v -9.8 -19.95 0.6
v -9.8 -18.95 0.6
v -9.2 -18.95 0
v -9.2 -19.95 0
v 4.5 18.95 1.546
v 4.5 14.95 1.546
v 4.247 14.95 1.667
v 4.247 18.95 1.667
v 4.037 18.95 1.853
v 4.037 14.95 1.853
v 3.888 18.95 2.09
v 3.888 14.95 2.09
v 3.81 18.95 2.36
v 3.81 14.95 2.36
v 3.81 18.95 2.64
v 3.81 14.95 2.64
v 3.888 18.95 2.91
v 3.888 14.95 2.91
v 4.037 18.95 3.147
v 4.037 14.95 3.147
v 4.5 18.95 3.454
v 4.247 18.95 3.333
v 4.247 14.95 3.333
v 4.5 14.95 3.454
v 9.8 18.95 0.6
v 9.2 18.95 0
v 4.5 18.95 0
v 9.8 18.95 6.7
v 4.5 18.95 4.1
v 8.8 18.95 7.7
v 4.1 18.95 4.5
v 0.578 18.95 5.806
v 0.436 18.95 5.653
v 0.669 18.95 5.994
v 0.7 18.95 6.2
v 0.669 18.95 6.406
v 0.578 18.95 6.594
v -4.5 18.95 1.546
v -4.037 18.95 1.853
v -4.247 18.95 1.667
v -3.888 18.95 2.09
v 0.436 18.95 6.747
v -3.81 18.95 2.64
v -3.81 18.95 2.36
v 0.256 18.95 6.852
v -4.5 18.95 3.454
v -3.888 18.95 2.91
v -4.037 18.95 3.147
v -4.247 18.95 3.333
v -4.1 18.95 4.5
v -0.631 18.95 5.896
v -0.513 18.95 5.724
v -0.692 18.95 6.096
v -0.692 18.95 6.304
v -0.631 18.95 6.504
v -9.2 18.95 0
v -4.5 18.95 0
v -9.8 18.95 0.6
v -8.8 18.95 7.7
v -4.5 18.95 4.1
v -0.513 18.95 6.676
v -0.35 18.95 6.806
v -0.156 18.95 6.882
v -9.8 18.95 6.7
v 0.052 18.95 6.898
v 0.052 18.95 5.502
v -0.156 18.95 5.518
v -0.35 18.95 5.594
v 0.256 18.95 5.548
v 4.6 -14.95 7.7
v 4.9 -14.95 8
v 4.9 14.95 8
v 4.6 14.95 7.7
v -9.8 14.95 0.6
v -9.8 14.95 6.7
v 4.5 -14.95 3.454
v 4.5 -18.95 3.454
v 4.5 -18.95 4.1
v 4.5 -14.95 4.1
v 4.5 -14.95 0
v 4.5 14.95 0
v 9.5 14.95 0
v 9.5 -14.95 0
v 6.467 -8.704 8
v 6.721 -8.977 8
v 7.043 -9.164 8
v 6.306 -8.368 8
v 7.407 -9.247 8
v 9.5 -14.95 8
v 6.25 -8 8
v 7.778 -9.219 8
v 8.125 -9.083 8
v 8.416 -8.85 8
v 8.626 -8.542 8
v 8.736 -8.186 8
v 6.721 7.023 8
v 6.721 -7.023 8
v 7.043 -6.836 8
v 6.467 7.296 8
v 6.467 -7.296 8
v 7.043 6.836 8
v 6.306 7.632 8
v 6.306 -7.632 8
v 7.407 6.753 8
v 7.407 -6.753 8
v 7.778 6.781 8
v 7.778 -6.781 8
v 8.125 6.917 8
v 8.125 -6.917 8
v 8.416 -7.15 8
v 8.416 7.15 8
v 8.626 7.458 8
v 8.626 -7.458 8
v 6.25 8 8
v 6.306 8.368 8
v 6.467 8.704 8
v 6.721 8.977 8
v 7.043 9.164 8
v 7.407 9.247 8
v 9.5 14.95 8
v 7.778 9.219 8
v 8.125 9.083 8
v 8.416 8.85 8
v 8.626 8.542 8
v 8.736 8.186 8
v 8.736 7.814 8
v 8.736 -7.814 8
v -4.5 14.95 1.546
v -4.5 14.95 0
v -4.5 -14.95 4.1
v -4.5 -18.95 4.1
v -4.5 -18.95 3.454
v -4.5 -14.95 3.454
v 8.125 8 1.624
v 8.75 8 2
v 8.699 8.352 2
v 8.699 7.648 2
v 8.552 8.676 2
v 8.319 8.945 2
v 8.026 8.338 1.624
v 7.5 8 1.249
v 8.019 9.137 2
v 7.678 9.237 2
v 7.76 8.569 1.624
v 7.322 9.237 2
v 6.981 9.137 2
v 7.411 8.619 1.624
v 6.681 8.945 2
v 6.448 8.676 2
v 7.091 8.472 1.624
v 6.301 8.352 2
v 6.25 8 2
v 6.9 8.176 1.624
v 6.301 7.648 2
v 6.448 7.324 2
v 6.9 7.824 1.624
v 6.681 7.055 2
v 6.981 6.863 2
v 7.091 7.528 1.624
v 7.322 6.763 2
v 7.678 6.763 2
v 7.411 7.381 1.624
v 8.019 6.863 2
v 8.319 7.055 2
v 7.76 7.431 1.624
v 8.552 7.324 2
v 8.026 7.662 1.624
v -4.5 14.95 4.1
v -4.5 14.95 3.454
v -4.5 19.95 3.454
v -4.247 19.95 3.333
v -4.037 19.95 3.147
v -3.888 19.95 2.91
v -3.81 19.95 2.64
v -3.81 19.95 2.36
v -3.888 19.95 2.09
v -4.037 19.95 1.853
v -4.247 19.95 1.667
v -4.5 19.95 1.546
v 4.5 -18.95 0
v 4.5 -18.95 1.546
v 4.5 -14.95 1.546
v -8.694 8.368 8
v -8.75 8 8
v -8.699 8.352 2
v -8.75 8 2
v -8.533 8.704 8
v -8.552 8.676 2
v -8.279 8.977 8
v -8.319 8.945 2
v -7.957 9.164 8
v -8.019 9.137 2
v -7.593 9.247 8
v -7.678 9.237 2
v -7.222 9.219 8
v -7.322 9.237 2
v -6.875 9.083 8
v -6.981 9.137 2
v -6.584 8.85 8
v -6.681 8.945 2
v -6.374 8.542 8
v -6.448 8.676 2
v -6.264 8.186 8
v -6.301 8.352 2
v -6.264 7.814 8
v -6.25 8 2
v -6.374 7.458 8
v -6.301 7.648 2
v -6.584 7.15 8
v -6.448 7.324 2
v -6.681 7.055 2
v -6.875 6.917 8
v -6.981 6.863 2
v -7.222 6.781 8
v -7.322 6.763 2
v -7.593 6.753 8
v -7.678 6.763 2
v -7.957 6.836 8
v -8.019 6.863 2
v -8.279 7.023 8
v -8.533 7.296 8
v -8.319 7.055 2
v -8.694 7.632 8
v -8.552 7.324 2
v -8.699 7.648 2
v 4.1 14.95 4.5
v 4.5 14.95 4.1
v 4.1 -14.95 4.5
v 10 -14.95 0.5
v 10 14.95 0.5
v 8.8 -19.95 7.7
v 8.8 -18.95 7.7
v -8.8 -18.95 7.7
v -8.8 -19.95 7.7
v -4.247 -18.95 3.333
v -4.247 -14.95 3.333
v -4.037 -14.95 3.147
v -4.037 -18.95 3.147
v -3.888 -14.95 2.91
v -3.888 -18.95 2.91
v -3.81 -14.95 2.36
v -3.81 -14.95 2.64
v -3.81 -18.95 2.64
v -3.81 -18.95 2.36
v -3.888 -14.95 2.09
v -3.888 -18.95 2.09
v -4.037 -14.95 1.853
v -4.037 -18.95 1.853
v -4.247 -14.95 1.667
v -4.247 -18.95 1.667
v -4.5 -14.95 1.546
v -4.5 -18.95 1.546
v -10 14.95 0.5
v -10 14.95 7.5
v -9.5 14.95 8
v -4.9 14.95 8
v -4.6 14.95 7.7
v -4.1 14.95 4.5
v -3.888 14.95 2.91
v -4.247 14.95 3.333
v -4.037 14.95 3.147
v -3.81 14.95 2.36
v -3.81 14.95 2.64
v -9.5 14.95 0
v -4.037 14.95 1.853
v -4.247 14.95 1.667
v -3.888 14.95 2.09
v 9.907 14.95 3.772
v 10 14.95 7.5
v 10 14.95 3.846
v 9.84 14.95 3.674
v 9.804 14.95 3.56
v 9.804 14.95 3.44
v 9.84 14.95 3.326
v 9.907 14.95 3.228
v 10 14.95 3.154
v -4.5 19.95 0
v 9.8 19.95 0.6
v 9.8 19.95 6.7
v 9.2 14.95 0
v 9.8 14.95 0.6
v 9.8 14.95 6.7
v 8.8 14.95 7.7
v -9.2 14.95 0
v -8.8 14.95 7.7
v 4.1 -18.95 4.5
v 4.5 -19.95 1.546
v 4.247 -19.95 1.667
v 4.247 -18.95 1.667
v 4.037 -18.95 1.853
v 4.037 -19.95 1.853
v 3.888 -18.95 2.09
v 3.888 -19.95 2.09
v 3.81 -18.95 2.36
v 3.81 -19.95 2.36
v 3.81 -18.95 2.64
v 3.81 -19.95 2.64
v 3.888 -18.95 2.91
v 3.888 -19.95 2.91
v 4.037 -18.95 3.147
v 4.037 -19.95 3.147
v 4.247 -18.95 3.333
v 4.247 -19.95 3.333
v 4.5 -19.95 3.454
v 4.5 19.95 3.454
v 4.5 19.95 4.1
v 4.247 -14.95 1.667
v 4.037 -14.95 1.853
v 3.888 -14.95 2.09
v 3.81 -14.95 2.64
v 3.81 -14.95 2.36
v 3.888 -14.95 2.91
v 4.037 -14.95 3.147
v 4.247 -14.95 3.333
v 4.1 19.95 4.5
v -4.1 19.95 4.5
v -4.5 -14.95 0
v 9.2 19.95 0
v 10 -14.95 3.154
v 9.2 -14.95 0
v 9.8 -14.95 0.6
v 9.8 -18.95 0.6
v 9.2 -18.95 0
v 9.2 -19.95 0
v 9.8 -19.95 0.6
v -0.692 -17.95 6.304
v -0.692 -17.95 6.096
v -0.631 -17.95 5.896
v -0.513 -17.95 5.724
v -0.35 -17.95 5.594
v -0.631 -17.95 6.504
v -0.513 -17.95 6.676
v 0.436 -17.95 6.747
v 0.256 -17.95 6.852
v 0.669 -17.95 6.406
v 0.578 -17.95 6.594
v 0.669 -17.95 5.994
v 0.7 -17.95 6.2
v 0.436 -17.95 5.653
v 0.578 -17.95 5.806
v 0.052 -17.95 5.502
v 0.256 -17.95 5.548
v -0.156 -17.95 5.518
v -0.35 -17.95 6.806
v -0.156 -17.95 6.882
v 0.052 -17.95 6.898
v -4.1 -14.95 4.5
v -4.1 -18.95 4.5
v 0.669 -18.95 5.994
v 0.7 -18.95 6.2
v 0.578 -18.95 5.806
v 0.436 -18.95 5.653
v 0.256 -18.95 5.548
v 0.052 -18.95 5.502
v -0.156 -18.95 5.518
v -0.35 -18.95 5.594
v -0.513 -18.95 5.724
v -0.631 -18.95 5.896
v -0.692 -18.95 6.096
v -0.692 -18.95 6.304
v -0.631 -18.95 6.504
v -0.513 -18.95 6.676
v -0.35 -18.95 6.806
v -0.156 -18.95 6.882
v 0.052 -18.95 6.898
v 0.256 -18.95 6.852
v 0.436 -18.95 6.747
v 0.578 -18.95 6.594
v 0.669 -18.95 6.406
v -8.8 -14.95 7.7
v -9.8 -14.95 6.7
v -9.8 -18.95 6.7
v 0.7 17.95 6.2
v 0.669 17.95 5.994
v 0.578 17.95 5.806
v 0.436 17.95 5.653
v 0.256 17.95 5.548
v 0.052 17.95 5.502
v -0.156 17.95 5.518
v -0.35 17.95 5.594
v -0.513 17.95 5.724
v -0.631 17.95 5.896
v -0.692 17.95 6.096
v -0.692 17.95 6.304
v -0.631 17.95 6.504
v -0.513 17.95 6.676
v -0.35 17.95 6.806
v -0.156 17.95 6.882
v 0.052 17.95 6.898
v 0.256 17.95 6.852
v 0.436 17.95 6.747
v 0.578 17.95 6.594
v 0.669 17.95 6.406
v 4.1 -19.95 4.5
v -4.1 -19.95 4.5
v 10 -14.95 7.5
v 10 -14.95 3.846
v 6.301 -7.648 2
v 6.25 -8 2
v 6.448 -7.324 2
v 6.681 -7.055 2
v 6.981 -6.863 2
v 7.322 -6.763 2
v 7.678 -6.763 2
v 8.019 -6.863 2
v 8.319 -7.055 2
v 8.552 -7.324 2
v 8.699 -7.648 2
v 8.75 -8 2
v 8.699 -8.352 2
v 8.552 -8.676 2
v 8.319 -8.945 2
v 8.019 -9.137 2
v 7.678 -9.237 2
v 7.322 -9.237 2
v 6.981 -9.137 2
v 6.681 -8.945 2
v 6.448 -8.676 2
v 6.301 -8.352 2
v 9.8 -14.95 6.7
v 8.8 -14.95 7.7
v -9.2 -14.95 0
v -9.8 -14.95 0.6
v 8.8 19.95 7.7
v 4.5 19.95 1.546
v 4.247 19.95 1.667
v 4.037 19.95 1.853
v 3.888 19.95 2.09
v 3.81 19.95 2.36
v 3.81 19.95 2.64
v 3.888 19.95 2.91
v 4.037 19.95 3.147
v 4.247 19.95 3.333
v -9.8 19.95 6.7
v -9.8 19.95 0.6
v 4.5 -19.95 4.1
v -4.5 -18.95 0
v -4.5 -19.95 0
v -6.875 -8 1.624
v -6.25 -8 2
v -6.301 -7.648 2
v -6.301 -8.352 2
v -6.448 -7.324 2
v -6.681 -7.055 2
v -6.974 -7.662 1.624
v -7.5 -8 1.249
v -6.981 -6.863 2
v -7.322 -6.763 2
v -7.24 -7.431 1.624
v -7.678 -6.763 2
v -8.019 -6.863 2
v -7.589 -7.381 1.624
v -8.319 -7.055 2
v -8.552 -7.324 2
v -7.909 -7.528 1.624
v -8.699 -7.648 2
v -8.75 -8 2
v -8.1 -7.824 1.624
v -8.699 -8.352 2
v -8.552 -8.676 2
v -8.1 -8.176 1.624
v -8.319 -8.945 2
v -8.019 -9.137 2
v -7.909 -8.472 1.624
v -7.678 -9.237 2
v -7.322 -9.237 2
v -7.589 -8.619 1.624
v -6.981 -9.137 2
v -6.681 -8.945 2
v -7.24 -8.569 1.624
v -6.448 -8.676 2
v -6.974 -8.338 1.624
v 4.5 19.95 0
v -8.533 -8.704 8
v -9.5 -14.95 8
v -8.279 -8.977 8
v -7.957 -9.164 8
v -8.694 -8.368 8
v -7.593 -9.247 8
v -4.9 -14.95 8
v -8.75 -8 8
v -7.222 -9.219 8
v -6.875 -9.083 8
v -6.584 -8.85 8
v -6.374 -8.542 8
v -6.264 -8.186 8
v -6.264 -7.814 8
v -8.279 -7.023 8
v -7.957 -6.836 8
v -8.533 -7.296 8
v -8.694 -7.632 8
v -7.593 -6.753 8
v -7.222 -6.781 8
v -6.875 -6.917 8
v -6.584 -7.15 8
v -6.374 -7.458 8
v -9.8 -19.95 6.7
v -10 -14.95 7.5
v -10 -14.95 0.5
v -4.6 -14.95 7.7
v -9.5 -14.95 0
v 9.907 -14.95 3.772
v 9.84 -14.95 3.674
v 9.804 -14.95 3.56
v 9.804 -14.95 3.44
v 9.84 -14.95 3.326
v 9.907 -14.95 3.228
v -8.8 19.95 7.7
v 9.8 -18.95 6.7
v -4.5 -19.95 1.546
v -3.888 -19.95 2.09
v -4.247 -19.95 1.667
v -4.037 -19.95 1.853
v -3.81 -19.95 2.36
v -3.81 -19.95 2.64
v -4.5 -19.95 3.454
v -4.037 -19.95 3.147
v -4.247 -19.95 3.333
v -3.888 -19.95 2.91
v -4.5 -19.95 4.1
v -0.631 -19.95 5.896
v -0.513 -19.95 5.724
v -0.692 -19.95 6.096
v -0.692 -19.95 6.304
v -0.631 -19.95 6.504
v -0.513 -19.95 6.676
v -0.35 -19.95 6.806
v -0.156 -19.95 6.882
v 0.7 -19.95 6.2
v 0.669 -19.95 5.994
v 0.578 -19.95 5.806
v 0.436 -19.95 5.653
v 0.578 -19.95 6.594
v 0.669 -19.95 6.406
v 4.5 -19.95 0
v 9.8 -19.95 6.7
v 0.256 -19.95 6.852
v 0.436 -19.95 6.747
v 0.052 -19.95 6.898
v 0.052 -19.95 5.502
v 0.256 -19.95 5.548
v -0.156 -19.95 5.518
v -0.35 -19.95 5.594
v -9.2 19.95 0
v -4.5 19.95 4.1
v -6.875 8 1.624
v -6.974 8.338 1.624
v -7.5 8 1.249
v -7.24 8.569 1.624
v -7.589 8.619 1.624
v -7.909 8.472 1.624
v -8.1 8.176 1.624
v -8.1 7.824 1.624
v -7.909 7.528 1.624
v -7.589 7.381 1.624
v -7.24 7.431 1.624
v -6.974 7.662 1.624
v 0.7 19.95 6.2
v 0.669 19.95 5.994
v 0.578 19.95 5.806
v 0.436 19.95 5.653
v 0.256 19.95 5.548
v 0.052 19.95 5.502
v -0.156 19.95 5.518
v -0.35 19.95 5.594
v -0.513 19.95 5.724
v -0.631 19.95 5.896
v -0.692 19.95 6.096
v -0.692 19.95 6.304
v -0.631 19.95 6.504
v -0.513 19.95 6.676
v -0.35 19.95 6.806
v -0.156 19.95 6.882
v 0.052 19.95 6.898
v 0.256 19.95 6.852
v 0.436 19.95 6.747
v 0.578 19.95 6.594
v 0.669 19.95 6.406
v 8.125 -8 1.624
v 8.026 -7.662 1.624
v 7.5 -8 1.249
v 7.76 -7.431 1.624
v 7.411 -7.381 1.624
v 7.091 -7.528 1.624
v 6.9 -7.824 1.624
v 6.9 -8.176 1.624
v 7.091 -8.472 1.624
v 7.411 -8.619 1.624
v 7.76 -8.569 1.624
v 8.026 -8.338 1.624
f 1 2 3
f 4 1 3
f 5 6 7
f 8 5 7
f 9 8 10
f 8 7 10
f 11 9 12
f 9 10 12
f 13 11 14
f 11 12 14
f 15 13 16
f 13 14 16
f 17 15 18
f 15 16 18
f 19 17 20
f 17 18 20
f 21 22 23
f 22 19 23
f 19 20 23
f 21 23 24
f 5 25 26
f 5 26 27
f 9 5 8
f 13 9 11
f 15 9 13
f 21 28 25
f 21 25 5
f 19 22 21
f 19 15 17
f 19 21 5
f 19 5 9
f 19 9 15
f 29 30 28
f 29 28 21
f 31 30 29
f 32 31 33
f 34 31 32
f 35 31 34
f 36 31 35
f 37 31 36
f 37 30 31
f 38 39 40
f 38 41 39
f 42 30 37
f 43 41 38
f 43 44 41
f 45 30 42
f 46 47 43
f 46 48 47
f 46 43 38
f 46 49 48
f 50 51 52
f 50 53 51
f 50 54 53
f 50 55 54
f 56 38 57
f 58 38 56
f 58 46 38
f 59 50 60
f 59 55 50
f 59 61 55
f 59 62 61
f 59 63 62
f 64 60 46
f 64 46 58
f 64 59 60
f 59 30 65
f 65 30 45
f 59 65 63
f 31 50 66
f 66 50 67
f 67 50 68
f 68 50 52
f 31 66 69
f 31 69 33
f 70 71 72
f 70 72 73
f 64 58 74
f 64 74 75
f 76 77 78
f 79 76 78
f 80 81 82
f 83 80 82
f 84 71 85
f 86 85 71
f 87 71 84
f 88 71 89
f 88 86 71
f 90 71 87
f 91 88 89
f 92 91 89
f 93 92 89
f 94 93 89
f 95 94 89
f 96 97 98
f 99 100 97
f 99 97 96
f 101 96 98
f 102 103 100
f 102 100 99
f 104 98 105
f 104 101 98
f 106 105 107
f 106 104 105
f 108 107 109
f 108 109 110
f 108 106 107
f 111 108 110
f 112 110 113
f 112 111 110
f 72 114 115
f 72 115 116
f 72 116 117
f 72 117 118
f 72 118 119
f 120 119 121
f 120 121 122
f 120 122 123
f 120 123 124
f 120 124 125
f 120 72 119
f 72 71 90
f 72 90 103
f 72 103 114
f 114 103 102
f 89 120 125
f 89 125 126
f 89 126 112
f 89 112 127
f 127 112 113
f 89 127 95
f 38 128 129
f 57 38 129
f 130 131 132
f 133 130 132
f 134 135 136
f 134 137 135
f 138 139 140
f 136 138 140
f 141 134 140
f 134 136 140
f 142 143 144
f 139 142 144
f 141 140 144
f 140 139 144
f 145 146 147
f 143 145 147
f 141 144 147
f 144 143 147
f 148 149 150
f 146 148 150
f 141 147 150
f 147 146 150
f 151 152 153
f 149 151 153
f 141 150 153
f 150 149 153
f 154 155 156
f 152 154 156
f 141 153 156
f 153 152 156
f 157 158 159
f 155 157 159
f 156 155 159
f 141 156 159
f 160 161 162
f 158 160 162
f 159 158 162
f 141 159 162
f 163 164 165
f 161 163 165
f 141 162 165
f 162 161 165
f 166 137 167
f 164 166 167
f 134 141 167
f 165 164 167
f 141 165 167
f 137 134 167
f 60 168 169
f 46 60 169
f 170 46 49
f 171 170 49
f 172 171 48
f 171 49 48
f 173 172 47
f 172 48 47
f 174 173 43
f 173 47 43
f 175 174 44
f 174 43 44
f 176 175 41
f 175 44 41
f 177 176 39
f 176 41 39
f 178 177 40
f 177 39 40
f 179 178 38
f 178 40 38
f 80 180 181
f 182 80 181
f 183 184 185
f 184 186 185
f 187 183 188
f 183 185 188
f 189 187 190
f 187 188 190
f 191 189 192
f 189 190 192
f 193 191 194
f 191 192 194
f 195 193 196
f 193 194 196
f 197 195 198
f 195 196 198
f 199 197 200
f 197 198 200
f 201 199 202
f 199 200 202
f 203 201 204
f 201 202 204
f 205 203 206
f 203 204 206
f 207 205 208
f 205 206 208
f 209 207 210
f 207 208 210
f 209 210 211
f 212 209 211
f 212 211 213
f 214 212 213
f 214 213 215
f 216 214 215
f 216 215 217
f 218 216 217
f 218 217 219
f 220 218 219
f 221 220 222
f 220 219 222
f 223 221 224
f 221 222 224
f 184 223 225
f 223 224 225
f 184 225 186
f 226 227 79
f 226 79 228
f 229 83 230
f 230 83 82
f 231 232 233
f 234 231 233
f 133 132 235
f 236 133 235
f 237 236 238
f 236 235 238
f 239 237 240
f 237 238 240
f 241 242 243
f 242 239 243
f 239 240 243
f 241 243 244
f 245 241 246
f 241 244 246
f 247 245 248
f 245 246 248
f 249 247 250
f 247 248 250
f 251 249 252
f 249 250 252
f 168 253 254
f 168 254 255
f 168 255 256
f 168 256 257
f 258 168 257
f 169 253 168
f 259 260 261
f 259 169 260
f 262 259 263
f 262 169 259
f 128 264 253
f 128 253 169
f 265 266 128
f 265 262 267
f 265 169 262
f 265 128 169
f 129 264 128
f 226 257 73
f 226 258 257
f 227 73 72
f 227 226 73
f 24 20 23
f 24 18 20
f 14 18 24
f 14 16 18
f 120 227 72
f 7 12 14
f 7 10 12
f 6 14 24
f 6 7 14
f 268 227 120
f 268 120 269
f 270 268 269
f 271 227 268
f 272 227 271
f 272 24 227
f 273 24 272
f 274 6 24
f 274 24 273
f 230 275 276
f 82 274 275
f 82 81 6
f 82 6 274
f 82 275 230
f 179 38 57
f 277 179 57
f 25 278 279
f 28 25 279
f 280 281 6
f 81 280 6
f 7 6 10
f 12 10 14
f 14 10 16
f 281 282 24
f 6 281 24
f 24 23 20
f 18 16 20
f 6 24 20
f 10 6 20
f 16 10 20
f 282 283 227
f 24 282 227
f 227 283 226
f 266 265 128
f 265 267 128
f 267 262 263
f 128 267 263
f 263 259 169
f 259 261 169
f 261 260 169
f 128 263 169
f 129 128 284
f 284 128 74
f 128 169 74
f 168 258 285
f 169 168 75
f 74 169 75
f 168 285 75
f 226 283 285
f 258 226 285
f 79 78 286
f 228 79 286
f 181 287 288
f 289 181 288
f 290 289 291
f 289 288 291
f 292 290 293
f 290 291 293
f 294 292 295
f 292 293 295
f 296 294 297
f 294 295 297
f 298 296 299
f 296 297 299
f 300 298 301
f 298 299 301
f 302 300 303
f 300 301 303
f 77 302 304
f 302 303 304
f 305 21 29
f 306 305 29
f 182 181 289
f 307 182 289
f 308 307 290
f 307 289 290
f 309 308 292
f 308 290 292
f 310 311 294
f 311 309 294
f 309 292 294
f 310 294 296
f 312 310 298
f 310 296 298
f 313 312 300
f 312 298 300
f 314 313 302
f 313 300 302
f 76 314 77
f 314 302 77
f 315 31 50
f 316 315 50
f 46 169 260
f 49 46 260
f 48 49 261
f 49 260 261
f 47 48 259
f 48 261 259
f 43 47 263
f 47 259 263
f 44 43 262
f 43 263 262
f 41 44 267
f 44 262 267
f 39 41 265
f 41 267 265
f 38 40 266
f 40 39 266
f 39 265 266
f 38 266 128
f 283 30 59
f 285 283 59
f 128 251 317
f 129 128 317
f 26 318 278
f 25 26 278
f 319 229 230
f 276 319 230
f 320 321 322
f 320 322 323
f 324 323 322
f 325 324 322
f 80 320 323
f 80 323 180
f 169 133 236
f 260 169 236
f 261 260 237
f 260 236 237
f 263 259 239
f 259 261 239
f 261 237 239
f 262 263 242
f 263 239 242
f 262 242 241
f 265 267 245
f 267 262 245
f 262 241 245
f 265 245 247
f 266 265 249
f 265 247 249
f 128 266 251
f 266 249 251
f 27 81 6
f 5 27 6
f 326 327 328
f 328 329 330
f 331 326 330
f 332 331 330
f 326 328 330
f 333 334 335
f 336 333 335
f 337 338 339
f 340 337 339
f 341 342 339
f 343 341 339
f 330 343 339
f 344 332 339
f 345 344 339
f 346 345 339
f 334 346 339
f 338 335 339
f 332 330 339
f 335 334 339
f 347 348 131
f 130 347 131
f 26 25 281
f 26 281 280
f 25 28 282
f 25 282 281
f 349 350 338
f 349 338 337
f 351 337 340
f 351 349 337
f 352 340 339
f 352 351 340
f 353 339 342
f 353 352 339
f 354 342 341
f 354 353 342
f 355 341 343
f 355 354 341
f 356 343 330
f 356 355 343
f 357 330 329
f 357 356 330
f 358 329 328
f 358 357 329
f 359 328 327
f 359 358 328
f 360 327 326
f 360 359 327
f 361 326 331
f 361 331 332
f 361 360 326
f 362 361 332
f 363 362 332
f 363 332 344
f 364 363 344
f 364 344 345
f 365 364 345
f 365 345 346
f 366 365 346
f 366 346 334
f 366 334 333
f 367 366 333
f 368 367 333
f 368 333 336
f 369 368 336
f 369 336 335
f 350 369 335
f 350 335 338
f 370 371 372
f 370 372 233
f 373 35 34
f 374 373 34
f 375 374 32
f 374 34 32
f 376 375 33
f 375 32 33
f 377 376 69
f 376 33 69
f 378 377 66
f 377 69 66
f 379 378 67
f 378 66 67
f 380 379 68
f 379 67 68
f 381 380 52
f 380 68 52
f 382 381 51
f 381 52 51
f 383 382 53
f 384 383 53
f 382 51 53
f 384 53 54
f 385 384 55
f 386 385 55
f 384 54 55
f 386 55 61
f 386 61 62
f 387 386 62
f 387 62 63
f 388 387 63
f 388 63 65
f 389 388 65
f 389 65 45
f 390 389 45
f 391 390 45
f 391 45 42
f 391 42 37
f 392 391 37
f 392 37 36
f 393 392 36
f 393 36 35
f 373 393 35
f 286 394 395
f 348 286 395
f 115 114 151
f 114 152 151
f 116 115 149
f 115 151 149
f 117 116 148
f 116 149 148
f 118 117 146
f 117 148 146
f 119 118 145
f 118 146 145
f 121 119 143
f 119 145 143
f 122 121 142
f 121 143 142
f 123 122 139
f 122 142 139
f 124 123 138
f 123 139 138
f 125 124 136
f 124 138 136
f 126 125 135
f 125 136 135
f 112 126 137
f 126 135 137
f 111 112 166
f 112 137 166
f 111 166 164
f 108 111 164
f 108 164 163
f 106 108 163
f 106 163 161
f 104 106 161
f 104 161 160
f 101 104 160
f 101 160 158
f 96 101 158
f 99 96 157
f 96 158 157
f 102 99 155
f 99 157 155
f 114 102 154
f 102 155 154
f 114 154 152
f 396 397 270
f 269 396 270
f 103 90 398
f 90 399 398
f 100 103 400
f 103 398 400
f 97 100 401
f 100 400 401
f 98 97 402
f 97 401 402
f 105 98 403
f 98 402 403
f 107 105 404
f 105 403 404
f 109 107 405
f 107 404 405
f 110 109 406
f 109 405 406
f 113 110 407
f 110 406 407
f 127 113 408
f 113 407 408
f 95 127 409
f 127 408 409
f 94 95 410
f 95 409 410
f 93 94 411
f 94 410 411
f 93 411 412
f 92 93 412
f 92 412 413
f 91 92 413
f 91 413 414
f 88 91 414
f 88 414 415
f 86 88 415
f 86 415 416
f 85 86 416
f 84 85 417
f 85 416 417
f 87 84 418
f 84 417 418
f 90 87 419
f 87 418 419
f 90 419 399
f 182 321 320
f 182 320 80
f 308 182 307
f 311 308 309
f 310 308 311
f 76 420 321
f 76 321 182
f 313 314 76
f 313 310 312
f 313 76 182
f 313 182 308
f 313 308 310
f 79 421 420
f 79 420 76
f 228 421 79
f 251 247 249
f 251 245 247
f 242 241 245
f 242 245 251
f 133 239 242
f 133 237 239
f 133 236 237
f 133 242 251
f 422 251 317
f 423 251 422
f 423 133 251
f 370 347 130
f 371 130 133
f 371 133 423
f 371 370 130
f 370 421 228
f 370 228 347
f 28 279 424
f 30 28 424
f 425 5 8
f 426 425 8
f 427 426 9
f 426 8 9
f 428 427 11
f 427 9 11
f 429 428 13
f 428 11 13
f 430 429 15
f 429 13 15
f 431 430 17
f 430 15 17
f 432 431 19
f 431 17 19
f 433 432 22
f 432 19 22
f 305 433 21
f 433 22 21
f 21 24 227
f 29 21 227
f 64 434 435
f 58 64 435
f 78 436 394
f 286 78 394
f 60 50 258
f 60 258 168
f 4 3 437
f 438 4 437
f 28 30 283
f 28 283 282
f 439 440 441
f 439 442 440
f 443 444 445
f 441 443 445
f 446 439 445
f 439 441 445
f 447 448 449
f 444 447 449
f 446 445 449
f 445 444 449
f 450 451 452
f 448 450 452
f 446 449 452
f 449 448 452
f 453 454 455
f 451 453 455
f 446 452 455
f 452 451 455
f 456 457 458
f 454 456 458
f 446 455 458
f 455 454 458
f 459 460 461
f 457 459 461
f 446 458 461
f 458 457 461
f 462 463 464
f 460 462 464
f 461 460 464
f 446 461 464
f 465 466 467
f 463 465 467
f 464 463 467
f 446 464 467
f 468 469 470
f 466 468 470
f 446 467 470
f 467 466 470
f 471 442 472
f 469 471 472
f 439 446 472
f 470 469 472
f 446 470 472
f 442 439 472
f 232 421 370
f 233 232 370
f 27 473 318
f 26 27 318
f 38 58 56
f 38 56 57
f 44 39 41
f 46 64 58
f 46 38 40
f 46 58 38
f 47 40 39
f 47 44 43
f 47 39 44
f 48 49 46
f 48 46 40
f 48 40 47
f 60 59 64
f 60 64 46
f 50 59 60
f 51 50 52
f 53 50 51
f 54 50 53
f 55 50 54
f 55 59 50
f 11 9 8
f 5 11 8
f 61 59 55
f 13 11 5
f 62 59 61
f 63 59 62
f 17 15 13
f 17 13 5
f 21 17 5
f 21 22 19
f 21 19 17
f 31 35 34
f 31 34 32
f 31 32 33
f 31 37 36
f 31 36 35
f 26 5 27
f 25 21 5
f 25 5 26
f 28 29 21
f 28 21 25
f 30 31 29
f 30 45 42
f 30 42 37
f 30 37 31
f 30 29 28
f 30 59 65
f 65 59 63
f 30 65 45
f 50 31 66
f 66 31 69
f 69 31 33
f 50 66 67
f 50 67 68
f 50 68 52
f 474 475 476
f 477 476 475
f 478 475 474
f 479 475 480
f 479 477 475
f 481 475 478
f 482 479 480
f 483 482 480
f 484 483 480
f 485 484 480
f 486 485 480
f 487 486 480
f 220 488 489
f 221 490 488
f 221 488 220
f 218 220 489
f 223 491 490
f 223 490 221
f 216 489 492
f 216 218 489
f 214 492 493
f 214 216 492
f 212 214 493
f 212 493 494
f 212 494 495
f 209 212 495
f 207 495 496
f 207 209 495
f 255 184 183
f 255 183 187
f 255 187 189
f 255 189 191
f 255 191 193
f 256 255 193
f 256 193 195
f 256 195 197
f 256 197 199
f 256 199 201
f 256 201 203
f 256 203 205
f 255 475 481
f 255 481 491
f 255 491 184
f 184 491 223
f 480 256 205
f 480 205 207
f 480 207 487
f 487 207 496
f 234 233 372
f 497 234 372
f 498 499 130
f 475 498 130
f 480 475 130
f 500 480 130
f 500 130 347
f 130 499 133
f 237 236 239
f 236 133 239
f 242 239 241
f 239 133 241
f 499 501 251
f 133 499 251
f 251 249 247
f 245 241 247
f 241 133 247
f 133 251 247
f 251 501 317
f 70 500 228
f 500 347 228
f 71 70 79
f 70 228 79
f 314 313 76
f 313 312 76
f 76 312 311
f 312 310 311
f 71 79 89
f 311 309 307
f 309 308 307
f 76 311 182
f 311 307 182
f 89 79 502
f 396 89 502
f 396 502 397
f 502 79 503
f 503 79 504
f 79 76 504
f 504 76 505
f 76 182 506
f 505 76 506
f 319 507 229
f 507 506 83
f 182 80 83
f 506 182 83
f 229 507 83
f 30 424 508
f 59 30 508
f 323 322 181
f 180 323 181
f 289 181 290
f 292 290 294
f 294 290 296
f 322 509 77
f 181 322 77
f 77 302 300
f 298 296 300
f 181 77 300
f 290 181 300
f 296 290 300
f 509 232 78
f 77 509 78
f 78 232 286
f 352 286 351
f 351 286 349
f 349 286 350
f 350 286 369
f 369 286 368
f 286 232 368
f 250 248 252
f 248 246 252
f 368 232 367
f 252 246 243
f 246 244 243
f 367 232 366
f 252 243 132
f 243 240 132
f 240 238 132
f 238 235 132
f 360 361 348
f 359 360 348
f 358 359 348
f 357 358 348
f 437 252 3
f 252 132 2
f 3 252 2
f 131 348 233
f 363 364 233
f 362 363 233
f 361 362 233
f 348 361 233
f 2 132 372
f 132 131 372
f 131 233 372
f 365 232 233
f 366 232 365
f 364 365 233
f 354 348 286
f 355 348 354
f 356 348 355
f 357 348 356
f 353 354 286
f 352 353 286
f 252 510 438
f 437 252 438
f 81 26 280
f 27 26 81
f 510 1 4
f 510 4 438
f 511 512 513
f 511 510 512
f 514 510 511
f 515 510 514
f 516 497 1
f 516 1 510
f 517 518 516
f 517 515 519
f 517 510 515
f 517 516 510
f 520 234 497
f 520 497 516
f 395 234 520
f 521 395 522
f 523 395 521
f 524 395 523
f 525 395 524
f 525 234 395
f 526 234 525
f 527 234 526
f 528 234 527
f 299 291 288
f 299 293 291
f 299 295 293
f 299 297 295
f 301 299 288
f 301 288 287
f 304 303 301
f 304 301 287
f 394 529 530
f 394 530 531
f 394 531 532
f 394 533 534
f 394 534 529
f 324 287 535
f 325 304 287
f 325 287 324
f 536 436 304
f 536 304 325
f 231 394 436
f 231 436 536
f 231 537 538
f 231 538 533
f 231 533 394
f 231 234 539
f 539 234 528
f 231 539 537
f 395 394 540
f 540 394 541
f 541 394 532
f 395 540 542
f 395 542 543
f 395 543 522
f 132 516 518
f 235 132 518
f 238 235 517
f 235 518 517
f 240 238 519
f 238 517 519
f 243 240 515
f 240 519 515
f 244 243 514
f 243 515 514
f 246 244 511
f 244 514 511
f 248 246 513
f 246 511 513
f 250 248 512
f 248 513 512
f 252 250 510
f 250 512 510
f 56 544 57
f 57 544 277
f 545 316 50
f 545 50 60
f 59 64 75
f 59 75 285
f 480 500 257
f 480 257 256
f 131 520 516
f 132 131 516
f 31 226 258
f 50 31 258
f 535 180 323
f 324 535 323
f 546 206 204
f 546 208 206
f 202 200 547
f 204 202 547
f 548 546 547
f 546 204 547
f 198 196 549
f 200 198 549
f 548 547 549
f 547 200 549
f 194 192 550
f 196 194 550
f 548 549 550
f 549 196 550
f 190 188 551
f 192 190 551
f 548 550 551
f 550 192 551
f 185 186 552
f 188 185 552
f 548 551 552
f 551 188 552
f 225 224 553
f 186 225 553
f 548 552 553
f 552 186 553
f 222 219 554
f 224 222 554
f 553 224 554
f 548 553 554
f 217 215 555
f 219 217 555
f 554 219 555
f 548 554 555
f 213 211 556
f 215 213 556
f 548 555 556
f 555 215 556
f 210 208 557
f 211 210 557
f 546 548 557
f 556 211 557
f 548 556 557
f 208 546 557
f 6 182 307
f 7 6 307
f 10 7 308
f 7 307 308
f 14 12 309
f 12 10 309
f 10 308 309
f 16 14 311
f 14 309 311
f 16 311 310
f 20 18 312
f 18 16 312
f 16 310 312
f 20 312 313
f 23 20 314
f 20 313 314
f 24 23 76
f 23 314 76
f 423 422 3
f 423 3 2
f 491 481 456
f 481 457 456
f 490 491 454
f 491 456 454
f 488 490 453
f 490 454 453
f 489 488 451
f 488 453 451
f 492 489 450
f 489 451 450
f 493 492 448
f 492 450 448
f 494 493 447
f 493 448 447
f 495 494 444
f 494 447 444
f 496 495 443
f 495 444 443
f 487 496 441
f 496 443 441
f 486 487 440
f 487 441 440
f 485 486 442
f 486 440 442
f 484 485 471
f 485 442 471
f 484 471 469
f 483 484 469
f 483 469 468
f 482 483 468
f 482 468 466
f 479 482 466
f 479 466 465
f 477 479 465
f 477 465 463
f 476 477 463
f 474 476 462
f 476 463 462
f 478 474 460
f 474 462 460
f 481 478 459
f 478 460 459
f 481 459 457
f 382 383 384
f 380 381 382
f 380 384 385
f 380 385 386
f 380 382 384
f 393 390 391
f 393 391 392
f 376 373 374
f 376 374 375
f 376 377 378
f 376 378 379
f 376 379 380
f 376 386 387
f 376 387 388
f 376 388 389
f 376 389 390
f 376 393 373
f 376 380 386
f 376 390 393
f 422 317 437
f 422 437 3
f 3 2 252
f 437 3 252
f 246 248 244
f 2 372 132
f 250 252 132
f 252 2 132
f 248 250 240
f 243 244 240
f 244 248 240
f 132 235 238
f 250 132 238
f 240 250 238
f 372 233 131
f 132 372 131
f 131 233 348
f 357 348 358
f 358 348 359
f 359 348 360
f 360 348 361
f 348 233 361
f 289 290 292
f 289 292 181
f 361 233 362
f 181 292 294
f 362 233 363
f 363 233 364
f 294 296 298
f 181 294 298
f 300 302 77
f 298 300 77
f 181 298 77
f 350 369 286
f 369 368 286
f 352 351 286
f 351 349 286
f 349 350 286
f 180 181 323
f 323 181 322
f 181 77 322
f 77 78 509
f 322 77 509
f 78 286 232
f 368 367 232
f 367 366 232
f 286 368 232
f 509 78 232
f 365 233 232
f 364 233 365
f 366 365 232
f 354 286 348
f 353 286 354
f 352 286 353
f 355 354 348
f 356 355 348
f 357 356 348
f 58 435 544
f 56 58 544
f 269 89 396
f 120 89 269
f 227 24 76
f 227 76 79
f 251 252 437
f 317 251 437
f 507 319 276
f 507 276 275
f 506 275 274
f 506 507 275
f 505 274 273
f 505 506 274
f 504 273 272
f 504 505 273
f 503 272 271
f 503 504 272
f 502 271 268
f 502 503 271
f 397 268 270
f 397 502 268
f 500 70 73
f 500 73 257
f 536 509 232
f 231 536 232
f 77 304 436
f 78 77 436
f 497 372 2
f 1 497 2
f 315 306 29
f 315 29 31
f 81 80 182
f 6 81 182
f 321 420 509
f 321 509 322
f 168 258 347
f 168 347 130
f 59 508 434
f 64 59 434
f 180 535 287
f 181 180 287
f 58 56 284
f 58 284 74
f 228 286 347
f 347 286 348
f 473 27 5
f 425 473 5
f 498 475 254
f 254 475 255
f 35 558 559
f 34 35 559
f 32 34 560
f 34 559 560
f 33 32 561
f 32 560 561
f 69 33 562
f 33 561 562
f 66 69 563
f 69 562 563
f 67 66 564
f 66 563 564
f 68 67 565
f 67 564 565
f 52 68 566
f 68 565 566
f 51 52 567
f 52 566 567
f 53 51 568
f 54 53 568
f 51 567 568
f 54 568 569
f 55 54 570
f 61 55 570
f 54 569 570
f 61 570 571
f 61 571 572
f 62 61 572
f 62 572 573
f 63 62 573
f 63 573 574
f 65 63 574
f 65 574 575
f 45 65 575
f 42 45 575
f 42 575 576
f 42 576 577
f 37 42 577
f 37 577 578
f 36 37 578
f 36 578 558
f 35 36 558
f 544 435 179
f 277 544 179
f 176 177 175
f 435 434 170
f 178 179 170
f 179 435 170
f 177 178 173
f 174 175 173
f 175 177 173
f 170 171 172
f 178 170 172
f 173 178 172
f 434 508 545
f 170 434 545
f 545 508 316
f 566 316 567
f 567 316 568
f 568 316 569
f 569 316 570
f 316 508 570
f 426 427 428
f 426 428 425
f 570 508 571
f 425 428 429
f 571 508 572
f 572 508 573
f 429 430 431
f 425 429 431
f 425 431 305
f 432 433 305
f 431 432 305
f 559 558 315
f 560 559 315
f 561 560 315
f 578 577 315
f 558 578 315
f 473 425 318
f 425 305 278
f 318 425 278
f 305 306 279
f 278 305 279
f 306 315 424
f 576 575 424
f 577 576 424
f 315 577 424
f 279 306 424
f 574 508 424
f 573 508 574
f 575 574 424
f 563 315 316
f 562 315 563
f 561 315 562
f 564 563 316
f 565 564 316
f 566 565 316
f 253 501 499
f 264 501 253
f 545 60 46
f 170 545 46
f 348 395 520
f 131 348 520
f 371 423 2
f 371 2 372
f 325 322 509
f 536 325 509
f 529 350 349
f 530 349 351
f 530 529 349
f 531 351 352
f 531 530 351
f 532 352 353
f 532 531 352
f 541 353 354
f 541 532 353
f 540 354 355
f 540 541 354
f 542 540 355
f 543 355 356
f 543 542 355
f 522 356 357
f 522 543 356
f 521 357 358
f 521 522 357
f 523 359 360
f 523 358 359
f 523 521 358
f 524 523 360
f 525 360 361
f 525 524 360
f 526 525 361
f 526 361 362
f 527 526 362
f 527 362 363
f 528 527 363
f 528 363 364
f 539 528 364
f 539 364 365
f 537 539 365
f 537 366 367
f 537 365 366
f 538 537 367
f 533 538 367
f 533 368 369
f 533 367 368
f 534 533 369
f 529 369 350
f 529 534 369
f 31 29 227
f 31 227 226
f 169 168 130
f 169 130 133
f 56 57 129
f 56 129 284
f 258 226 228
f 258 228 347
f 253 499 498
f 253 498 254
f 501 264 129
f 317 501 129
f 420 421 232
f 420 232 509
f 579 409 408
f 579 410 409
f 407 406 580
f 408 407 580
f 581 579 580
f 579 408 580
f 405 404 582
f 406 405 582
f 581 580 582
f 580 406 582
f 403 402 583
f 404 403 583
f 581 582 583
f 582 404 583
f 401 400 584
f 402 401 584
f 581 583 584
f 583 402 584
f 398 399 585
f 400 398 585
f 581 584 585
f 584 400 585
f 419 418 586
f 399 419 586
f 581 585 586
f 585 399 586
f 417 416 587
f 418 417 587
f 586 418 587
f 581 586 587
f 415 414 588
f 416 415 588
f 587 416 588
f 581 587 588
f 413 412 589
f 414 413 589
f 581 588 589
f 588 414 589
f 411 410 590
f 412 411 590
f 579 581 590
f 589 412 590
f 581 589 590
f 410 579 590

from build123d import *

# Parameters (mm, degrees)
SKICA1_W                 = 20
SKICA1_H                 = 29.9
P_IDAT_VYSUNUT_M1_DEPTH  = 8
ZKOSEN_1_SIZE            = 0.5
ODEBRAT_VYSUNUT_M1_DEPTH = 30.9
M3_Z_VIT1_D              = 2.5
M3_Z_VIT1_DEPTH          = 6
M3_Z_VIT1_TIP            = 0.751075774
P_IDAT_VYSUNUT_M2_DEPTH  = 4
P_IDAT_VYSUNUT_M3_DEPTH  = 1
LINPOLE1_COUNT           = 2
LINPOLE1_PITCH           = 33.9
LINPOLE2_COUNT           = 2
LINPOLE2_PITCH           = 38.9
ODEBRAT_VYSUNUT_M2_DEPTH = 40.9
ODEBRAT_VYSUNUT_M3_DEPTH = 35.9
SKICA9_R                 = 0.7
ODEBRAT_VYSUNUT_M4_DEPTH = 2


with BuildPart() as part:
    # Skica1 → Přidat vysunutím1 (new body)
    with BuildSketch(Plane.XY):
        Rectangle(SKICA1_W, SKICA1_H)
    extrude(amount=P_IDAT_VYSUNUT_M1_DEPTH)

    # Zkosení1
    zkosen_1_edges = [part.edges().sort_by_distance(p)[0] for p in [
        (-10, 0, 8),
        (10, 0, 8),
        (-10, 0, 0),
        (10, 0, 0),
    ]]
    chamfer(zkosen_1_edges, length=ZKOSEN_1_SIZE)

    # Skica2 → Odebrat vysunutím1 (cut, through all)
    with BuildSketch(Plane.XZ.offset(14.95)):
        Polygon((-4.9, 8), (4.9, 8), (4.6, 7.7), (-4.6, 7.7), align=None)
    extrude(amount=-ODEBRAT_VYSUNUT_M1_DEPTH, mode=Mode.SUBTRACT)

    # M3 závit1
    with Locations(Plane.XY.offset(8)):
        with Locations((-7.5, 8), (-7.5, -8), (7.5, -8), (7.5, 8)):
            Hole(M3_Z_VIT1_D / 2, depth=M3_Z_VIT1_DEPTH)
            with Locations((0, 0, -(M3_Z_VIT1_DEPTH + M3_Z_VIT1_TIP / 2))):  # 118° drill point
                Cone(0, M3_Z_VIT1_D / 2, M3_Z_VIT1_TIP, mode=Mode.SUBTRACT)


with BuildPart() as body_2:
    # Skica5 → Přidat vysunutím2 (new body)
    with BuildSketch(Plane.XZ.offset(14.95)):
        Polygon((-4.6, 7.7), (4.6, 7.7), (8.8, 7.7), (9.8, 6.7), (9.8, 0.6), (9.2, 0), (-9.2, 0), (-9.8, 0.6), (-9.8, 6.7), (-8.8, 7.7), align=None)
    p_idat_vysunut_m2 = extrude(amount=P_IDAT_VYSUNUT_M2_DEPTH)


with BuildPart() as body_3:
    # Skica6 → Přidat vysunutím3 (new body)
    with BuildSketch(Plane.XZ.offset(18.95)):
        Polygon((8.8, 7.7), (-8.8, 7.7), (-9.8, 6.7), (-9.8, 0.6), (-9.2, 0), (9.2, 0), (9.8, 0.6), (9.8, 6.7), align=None)
    extrude(amount=P_IDAT_VYSUNUT_M3_DEPTH)


with BuildPart() as linpole1_1:
    # LinPole1: Přidat vysunutím2 ×2
    with Locations(*[(0, i * LINPOLE1_PITCH, 0) for i in range(1, LINPOLE1_COUNT)]):
        add(p_idat_vysunut_m2)


with BuildPart() as linpole2_1:
    # LinPole2: pattern copy
    add(body_3.part.moved(Location(Vector(0, 1, 0) * (1 * LINPOLE2_PITCH))))


with BuildPart() as odebrat_vysunut_m2_tool:
    # Skica7 → Odebrat vysunutím2 (new body, through all)
    with BuildSketch(Plane.XZ.offset(19.95)):
        with BuildLine():
            Line((-4.5, 1.546060799), (-4.5, 0))
            Line((-4.5, 0), (4.5, 0))
            Line((4.5, 0), (4.5, 1.546060799))
            ThreePointArc((4.5, 1.546060799), (3.8, 2.5), (4.5, 3.453939201))
            Line((4.5, 3.453939201), (4.5, 4.1))
            Line((4.5, 4.1), (4.1, 4.5))
            Line((4.1, 4.5), (-4.1, 4.5))
            Line((-4.1, 4.5), (-4.5, 4.1))
            Line((-4.5, 4.1), (-4.5, 3.453939201))
            ThreePointArc((-4.5, 3.453939201), (-3.8, 2.5), (-4.5, 1.546060799))
        make_face()
    extrude(amount=-ODEBRAT_VYSUNUT_M2_DEPTH)


with BuildPart() as part_1:
    add(part.part)

    # Odebrat vysunutím2: cut by odebrat_vysunut_m2_tool
    add(odebrat_vysunut_m2_tool.part, mode=Mode.SUBTRACT)

    # Skica8 → Odebrat vysunutím3 (cut, through all)
    with BuildSketch(Plane.XZ.offset(14.95)):
        with BuildLine():
            Line((10, 3.846410162), (10, 3.153589838))
            ThreePointArc((10, 3.153589838), (9.8, 3.5), (10, 3.846410162))
        make_face()
    extrude(amount=-ODEBRAT_VYSUNUT_M3_DEPTH, mode=Mode.SUBTRACT)


with BuildPart() as body_2_1:
    add(body_2.part)

    # Odebrat vysunutím2: cut by odebrat_vysunut_m2_tool
    add(odebrat_vysunut_m2_tool.part, mode=Mode.SUBTRACT)


with BuildPart() as body_3_1:
    add(body_3.part)

    # Odebrat vysunutím2: cut by odebrat_vysunut_m2_tool
    add(odebrat_vysunut_m2_tool.part, mode=Mode.SUBTRACT)


with BuildPart() as linpole1_1_1:
    add(linpole1_1.part)

    # Odebrat vysunutím2: cut by odebrat_vysunut_m2_tool
    add(odebrat_vysunut_m2_tool.part, mode=Mode.SUBTRACT)


with BuildPart() as linpole2_1_1:
    add(linpole2_1.part)

    # Odebrat vysunutím2: cut by odebrat_vysunut_m2_tool
    add(odebrat_vysunut_m2_tool.part, mode=Mode.SUBTRACT)


with BuildPart() as odebrat_vysunut_m4_tool:
    # Skica9 → Odebrat vysunutím4 (new body)
    with BuildSketch(Plane(origin=(0, 19.95, 0), x_dir=(1, 0, 0), z_dir=(0, 1, 0))):
        with Locations((0, -6.2)):
            Circle(SKICA9_R)
    odebrat_vysunut_m4 = extrude(amount=-ODEBRAT_VYSUNUT_M4_DEPTH)


with BuildPart() as linpole1_1_2:
    add(linpole1_1_1.part)

    # Odebrat vysunutím4: cut by odebrat_vysunut_m4_tool
    add(odebrat_vysunut_m4_tool.part, mode=Mode.SUBTRACT)


with BuildPart() as linpole2_1_2:
    add(linpole2_1_1.part)

    # Odebrat vysunutím4: cut by odebrat_vysunut_m4_tool
    add(odebrat_vysunut_m4_tool.part, mode=Mode.SUBTRACT)


with BuildPart() as zrcadlit4_tool:
    # Zrcadlit4: Odebrat vysunutím4 across plane
    add(odebrat_vysunut_m4.mirror(Plane.ZX))


with BuildPart() as body_2_2:
    add(body_2_1.part)

    # Zrcadlit4: cut by zrcadlit4_tool
    add(zrcadlit4_tool.part, mode=Mode.SUBTRACT)


with BuildPart() as body_3_2:
    add(body_3_1.part)

    # Zrcadlit4: cut by zrcadlit4_tool
    add(zrcadlit4_tool.part, mode=Mode.SUBTRACT)


solid = Compound([part_1.part, linpole1_1_2.part, linpole2_1_2.part, body_2_2.part, body_3_2.part])
